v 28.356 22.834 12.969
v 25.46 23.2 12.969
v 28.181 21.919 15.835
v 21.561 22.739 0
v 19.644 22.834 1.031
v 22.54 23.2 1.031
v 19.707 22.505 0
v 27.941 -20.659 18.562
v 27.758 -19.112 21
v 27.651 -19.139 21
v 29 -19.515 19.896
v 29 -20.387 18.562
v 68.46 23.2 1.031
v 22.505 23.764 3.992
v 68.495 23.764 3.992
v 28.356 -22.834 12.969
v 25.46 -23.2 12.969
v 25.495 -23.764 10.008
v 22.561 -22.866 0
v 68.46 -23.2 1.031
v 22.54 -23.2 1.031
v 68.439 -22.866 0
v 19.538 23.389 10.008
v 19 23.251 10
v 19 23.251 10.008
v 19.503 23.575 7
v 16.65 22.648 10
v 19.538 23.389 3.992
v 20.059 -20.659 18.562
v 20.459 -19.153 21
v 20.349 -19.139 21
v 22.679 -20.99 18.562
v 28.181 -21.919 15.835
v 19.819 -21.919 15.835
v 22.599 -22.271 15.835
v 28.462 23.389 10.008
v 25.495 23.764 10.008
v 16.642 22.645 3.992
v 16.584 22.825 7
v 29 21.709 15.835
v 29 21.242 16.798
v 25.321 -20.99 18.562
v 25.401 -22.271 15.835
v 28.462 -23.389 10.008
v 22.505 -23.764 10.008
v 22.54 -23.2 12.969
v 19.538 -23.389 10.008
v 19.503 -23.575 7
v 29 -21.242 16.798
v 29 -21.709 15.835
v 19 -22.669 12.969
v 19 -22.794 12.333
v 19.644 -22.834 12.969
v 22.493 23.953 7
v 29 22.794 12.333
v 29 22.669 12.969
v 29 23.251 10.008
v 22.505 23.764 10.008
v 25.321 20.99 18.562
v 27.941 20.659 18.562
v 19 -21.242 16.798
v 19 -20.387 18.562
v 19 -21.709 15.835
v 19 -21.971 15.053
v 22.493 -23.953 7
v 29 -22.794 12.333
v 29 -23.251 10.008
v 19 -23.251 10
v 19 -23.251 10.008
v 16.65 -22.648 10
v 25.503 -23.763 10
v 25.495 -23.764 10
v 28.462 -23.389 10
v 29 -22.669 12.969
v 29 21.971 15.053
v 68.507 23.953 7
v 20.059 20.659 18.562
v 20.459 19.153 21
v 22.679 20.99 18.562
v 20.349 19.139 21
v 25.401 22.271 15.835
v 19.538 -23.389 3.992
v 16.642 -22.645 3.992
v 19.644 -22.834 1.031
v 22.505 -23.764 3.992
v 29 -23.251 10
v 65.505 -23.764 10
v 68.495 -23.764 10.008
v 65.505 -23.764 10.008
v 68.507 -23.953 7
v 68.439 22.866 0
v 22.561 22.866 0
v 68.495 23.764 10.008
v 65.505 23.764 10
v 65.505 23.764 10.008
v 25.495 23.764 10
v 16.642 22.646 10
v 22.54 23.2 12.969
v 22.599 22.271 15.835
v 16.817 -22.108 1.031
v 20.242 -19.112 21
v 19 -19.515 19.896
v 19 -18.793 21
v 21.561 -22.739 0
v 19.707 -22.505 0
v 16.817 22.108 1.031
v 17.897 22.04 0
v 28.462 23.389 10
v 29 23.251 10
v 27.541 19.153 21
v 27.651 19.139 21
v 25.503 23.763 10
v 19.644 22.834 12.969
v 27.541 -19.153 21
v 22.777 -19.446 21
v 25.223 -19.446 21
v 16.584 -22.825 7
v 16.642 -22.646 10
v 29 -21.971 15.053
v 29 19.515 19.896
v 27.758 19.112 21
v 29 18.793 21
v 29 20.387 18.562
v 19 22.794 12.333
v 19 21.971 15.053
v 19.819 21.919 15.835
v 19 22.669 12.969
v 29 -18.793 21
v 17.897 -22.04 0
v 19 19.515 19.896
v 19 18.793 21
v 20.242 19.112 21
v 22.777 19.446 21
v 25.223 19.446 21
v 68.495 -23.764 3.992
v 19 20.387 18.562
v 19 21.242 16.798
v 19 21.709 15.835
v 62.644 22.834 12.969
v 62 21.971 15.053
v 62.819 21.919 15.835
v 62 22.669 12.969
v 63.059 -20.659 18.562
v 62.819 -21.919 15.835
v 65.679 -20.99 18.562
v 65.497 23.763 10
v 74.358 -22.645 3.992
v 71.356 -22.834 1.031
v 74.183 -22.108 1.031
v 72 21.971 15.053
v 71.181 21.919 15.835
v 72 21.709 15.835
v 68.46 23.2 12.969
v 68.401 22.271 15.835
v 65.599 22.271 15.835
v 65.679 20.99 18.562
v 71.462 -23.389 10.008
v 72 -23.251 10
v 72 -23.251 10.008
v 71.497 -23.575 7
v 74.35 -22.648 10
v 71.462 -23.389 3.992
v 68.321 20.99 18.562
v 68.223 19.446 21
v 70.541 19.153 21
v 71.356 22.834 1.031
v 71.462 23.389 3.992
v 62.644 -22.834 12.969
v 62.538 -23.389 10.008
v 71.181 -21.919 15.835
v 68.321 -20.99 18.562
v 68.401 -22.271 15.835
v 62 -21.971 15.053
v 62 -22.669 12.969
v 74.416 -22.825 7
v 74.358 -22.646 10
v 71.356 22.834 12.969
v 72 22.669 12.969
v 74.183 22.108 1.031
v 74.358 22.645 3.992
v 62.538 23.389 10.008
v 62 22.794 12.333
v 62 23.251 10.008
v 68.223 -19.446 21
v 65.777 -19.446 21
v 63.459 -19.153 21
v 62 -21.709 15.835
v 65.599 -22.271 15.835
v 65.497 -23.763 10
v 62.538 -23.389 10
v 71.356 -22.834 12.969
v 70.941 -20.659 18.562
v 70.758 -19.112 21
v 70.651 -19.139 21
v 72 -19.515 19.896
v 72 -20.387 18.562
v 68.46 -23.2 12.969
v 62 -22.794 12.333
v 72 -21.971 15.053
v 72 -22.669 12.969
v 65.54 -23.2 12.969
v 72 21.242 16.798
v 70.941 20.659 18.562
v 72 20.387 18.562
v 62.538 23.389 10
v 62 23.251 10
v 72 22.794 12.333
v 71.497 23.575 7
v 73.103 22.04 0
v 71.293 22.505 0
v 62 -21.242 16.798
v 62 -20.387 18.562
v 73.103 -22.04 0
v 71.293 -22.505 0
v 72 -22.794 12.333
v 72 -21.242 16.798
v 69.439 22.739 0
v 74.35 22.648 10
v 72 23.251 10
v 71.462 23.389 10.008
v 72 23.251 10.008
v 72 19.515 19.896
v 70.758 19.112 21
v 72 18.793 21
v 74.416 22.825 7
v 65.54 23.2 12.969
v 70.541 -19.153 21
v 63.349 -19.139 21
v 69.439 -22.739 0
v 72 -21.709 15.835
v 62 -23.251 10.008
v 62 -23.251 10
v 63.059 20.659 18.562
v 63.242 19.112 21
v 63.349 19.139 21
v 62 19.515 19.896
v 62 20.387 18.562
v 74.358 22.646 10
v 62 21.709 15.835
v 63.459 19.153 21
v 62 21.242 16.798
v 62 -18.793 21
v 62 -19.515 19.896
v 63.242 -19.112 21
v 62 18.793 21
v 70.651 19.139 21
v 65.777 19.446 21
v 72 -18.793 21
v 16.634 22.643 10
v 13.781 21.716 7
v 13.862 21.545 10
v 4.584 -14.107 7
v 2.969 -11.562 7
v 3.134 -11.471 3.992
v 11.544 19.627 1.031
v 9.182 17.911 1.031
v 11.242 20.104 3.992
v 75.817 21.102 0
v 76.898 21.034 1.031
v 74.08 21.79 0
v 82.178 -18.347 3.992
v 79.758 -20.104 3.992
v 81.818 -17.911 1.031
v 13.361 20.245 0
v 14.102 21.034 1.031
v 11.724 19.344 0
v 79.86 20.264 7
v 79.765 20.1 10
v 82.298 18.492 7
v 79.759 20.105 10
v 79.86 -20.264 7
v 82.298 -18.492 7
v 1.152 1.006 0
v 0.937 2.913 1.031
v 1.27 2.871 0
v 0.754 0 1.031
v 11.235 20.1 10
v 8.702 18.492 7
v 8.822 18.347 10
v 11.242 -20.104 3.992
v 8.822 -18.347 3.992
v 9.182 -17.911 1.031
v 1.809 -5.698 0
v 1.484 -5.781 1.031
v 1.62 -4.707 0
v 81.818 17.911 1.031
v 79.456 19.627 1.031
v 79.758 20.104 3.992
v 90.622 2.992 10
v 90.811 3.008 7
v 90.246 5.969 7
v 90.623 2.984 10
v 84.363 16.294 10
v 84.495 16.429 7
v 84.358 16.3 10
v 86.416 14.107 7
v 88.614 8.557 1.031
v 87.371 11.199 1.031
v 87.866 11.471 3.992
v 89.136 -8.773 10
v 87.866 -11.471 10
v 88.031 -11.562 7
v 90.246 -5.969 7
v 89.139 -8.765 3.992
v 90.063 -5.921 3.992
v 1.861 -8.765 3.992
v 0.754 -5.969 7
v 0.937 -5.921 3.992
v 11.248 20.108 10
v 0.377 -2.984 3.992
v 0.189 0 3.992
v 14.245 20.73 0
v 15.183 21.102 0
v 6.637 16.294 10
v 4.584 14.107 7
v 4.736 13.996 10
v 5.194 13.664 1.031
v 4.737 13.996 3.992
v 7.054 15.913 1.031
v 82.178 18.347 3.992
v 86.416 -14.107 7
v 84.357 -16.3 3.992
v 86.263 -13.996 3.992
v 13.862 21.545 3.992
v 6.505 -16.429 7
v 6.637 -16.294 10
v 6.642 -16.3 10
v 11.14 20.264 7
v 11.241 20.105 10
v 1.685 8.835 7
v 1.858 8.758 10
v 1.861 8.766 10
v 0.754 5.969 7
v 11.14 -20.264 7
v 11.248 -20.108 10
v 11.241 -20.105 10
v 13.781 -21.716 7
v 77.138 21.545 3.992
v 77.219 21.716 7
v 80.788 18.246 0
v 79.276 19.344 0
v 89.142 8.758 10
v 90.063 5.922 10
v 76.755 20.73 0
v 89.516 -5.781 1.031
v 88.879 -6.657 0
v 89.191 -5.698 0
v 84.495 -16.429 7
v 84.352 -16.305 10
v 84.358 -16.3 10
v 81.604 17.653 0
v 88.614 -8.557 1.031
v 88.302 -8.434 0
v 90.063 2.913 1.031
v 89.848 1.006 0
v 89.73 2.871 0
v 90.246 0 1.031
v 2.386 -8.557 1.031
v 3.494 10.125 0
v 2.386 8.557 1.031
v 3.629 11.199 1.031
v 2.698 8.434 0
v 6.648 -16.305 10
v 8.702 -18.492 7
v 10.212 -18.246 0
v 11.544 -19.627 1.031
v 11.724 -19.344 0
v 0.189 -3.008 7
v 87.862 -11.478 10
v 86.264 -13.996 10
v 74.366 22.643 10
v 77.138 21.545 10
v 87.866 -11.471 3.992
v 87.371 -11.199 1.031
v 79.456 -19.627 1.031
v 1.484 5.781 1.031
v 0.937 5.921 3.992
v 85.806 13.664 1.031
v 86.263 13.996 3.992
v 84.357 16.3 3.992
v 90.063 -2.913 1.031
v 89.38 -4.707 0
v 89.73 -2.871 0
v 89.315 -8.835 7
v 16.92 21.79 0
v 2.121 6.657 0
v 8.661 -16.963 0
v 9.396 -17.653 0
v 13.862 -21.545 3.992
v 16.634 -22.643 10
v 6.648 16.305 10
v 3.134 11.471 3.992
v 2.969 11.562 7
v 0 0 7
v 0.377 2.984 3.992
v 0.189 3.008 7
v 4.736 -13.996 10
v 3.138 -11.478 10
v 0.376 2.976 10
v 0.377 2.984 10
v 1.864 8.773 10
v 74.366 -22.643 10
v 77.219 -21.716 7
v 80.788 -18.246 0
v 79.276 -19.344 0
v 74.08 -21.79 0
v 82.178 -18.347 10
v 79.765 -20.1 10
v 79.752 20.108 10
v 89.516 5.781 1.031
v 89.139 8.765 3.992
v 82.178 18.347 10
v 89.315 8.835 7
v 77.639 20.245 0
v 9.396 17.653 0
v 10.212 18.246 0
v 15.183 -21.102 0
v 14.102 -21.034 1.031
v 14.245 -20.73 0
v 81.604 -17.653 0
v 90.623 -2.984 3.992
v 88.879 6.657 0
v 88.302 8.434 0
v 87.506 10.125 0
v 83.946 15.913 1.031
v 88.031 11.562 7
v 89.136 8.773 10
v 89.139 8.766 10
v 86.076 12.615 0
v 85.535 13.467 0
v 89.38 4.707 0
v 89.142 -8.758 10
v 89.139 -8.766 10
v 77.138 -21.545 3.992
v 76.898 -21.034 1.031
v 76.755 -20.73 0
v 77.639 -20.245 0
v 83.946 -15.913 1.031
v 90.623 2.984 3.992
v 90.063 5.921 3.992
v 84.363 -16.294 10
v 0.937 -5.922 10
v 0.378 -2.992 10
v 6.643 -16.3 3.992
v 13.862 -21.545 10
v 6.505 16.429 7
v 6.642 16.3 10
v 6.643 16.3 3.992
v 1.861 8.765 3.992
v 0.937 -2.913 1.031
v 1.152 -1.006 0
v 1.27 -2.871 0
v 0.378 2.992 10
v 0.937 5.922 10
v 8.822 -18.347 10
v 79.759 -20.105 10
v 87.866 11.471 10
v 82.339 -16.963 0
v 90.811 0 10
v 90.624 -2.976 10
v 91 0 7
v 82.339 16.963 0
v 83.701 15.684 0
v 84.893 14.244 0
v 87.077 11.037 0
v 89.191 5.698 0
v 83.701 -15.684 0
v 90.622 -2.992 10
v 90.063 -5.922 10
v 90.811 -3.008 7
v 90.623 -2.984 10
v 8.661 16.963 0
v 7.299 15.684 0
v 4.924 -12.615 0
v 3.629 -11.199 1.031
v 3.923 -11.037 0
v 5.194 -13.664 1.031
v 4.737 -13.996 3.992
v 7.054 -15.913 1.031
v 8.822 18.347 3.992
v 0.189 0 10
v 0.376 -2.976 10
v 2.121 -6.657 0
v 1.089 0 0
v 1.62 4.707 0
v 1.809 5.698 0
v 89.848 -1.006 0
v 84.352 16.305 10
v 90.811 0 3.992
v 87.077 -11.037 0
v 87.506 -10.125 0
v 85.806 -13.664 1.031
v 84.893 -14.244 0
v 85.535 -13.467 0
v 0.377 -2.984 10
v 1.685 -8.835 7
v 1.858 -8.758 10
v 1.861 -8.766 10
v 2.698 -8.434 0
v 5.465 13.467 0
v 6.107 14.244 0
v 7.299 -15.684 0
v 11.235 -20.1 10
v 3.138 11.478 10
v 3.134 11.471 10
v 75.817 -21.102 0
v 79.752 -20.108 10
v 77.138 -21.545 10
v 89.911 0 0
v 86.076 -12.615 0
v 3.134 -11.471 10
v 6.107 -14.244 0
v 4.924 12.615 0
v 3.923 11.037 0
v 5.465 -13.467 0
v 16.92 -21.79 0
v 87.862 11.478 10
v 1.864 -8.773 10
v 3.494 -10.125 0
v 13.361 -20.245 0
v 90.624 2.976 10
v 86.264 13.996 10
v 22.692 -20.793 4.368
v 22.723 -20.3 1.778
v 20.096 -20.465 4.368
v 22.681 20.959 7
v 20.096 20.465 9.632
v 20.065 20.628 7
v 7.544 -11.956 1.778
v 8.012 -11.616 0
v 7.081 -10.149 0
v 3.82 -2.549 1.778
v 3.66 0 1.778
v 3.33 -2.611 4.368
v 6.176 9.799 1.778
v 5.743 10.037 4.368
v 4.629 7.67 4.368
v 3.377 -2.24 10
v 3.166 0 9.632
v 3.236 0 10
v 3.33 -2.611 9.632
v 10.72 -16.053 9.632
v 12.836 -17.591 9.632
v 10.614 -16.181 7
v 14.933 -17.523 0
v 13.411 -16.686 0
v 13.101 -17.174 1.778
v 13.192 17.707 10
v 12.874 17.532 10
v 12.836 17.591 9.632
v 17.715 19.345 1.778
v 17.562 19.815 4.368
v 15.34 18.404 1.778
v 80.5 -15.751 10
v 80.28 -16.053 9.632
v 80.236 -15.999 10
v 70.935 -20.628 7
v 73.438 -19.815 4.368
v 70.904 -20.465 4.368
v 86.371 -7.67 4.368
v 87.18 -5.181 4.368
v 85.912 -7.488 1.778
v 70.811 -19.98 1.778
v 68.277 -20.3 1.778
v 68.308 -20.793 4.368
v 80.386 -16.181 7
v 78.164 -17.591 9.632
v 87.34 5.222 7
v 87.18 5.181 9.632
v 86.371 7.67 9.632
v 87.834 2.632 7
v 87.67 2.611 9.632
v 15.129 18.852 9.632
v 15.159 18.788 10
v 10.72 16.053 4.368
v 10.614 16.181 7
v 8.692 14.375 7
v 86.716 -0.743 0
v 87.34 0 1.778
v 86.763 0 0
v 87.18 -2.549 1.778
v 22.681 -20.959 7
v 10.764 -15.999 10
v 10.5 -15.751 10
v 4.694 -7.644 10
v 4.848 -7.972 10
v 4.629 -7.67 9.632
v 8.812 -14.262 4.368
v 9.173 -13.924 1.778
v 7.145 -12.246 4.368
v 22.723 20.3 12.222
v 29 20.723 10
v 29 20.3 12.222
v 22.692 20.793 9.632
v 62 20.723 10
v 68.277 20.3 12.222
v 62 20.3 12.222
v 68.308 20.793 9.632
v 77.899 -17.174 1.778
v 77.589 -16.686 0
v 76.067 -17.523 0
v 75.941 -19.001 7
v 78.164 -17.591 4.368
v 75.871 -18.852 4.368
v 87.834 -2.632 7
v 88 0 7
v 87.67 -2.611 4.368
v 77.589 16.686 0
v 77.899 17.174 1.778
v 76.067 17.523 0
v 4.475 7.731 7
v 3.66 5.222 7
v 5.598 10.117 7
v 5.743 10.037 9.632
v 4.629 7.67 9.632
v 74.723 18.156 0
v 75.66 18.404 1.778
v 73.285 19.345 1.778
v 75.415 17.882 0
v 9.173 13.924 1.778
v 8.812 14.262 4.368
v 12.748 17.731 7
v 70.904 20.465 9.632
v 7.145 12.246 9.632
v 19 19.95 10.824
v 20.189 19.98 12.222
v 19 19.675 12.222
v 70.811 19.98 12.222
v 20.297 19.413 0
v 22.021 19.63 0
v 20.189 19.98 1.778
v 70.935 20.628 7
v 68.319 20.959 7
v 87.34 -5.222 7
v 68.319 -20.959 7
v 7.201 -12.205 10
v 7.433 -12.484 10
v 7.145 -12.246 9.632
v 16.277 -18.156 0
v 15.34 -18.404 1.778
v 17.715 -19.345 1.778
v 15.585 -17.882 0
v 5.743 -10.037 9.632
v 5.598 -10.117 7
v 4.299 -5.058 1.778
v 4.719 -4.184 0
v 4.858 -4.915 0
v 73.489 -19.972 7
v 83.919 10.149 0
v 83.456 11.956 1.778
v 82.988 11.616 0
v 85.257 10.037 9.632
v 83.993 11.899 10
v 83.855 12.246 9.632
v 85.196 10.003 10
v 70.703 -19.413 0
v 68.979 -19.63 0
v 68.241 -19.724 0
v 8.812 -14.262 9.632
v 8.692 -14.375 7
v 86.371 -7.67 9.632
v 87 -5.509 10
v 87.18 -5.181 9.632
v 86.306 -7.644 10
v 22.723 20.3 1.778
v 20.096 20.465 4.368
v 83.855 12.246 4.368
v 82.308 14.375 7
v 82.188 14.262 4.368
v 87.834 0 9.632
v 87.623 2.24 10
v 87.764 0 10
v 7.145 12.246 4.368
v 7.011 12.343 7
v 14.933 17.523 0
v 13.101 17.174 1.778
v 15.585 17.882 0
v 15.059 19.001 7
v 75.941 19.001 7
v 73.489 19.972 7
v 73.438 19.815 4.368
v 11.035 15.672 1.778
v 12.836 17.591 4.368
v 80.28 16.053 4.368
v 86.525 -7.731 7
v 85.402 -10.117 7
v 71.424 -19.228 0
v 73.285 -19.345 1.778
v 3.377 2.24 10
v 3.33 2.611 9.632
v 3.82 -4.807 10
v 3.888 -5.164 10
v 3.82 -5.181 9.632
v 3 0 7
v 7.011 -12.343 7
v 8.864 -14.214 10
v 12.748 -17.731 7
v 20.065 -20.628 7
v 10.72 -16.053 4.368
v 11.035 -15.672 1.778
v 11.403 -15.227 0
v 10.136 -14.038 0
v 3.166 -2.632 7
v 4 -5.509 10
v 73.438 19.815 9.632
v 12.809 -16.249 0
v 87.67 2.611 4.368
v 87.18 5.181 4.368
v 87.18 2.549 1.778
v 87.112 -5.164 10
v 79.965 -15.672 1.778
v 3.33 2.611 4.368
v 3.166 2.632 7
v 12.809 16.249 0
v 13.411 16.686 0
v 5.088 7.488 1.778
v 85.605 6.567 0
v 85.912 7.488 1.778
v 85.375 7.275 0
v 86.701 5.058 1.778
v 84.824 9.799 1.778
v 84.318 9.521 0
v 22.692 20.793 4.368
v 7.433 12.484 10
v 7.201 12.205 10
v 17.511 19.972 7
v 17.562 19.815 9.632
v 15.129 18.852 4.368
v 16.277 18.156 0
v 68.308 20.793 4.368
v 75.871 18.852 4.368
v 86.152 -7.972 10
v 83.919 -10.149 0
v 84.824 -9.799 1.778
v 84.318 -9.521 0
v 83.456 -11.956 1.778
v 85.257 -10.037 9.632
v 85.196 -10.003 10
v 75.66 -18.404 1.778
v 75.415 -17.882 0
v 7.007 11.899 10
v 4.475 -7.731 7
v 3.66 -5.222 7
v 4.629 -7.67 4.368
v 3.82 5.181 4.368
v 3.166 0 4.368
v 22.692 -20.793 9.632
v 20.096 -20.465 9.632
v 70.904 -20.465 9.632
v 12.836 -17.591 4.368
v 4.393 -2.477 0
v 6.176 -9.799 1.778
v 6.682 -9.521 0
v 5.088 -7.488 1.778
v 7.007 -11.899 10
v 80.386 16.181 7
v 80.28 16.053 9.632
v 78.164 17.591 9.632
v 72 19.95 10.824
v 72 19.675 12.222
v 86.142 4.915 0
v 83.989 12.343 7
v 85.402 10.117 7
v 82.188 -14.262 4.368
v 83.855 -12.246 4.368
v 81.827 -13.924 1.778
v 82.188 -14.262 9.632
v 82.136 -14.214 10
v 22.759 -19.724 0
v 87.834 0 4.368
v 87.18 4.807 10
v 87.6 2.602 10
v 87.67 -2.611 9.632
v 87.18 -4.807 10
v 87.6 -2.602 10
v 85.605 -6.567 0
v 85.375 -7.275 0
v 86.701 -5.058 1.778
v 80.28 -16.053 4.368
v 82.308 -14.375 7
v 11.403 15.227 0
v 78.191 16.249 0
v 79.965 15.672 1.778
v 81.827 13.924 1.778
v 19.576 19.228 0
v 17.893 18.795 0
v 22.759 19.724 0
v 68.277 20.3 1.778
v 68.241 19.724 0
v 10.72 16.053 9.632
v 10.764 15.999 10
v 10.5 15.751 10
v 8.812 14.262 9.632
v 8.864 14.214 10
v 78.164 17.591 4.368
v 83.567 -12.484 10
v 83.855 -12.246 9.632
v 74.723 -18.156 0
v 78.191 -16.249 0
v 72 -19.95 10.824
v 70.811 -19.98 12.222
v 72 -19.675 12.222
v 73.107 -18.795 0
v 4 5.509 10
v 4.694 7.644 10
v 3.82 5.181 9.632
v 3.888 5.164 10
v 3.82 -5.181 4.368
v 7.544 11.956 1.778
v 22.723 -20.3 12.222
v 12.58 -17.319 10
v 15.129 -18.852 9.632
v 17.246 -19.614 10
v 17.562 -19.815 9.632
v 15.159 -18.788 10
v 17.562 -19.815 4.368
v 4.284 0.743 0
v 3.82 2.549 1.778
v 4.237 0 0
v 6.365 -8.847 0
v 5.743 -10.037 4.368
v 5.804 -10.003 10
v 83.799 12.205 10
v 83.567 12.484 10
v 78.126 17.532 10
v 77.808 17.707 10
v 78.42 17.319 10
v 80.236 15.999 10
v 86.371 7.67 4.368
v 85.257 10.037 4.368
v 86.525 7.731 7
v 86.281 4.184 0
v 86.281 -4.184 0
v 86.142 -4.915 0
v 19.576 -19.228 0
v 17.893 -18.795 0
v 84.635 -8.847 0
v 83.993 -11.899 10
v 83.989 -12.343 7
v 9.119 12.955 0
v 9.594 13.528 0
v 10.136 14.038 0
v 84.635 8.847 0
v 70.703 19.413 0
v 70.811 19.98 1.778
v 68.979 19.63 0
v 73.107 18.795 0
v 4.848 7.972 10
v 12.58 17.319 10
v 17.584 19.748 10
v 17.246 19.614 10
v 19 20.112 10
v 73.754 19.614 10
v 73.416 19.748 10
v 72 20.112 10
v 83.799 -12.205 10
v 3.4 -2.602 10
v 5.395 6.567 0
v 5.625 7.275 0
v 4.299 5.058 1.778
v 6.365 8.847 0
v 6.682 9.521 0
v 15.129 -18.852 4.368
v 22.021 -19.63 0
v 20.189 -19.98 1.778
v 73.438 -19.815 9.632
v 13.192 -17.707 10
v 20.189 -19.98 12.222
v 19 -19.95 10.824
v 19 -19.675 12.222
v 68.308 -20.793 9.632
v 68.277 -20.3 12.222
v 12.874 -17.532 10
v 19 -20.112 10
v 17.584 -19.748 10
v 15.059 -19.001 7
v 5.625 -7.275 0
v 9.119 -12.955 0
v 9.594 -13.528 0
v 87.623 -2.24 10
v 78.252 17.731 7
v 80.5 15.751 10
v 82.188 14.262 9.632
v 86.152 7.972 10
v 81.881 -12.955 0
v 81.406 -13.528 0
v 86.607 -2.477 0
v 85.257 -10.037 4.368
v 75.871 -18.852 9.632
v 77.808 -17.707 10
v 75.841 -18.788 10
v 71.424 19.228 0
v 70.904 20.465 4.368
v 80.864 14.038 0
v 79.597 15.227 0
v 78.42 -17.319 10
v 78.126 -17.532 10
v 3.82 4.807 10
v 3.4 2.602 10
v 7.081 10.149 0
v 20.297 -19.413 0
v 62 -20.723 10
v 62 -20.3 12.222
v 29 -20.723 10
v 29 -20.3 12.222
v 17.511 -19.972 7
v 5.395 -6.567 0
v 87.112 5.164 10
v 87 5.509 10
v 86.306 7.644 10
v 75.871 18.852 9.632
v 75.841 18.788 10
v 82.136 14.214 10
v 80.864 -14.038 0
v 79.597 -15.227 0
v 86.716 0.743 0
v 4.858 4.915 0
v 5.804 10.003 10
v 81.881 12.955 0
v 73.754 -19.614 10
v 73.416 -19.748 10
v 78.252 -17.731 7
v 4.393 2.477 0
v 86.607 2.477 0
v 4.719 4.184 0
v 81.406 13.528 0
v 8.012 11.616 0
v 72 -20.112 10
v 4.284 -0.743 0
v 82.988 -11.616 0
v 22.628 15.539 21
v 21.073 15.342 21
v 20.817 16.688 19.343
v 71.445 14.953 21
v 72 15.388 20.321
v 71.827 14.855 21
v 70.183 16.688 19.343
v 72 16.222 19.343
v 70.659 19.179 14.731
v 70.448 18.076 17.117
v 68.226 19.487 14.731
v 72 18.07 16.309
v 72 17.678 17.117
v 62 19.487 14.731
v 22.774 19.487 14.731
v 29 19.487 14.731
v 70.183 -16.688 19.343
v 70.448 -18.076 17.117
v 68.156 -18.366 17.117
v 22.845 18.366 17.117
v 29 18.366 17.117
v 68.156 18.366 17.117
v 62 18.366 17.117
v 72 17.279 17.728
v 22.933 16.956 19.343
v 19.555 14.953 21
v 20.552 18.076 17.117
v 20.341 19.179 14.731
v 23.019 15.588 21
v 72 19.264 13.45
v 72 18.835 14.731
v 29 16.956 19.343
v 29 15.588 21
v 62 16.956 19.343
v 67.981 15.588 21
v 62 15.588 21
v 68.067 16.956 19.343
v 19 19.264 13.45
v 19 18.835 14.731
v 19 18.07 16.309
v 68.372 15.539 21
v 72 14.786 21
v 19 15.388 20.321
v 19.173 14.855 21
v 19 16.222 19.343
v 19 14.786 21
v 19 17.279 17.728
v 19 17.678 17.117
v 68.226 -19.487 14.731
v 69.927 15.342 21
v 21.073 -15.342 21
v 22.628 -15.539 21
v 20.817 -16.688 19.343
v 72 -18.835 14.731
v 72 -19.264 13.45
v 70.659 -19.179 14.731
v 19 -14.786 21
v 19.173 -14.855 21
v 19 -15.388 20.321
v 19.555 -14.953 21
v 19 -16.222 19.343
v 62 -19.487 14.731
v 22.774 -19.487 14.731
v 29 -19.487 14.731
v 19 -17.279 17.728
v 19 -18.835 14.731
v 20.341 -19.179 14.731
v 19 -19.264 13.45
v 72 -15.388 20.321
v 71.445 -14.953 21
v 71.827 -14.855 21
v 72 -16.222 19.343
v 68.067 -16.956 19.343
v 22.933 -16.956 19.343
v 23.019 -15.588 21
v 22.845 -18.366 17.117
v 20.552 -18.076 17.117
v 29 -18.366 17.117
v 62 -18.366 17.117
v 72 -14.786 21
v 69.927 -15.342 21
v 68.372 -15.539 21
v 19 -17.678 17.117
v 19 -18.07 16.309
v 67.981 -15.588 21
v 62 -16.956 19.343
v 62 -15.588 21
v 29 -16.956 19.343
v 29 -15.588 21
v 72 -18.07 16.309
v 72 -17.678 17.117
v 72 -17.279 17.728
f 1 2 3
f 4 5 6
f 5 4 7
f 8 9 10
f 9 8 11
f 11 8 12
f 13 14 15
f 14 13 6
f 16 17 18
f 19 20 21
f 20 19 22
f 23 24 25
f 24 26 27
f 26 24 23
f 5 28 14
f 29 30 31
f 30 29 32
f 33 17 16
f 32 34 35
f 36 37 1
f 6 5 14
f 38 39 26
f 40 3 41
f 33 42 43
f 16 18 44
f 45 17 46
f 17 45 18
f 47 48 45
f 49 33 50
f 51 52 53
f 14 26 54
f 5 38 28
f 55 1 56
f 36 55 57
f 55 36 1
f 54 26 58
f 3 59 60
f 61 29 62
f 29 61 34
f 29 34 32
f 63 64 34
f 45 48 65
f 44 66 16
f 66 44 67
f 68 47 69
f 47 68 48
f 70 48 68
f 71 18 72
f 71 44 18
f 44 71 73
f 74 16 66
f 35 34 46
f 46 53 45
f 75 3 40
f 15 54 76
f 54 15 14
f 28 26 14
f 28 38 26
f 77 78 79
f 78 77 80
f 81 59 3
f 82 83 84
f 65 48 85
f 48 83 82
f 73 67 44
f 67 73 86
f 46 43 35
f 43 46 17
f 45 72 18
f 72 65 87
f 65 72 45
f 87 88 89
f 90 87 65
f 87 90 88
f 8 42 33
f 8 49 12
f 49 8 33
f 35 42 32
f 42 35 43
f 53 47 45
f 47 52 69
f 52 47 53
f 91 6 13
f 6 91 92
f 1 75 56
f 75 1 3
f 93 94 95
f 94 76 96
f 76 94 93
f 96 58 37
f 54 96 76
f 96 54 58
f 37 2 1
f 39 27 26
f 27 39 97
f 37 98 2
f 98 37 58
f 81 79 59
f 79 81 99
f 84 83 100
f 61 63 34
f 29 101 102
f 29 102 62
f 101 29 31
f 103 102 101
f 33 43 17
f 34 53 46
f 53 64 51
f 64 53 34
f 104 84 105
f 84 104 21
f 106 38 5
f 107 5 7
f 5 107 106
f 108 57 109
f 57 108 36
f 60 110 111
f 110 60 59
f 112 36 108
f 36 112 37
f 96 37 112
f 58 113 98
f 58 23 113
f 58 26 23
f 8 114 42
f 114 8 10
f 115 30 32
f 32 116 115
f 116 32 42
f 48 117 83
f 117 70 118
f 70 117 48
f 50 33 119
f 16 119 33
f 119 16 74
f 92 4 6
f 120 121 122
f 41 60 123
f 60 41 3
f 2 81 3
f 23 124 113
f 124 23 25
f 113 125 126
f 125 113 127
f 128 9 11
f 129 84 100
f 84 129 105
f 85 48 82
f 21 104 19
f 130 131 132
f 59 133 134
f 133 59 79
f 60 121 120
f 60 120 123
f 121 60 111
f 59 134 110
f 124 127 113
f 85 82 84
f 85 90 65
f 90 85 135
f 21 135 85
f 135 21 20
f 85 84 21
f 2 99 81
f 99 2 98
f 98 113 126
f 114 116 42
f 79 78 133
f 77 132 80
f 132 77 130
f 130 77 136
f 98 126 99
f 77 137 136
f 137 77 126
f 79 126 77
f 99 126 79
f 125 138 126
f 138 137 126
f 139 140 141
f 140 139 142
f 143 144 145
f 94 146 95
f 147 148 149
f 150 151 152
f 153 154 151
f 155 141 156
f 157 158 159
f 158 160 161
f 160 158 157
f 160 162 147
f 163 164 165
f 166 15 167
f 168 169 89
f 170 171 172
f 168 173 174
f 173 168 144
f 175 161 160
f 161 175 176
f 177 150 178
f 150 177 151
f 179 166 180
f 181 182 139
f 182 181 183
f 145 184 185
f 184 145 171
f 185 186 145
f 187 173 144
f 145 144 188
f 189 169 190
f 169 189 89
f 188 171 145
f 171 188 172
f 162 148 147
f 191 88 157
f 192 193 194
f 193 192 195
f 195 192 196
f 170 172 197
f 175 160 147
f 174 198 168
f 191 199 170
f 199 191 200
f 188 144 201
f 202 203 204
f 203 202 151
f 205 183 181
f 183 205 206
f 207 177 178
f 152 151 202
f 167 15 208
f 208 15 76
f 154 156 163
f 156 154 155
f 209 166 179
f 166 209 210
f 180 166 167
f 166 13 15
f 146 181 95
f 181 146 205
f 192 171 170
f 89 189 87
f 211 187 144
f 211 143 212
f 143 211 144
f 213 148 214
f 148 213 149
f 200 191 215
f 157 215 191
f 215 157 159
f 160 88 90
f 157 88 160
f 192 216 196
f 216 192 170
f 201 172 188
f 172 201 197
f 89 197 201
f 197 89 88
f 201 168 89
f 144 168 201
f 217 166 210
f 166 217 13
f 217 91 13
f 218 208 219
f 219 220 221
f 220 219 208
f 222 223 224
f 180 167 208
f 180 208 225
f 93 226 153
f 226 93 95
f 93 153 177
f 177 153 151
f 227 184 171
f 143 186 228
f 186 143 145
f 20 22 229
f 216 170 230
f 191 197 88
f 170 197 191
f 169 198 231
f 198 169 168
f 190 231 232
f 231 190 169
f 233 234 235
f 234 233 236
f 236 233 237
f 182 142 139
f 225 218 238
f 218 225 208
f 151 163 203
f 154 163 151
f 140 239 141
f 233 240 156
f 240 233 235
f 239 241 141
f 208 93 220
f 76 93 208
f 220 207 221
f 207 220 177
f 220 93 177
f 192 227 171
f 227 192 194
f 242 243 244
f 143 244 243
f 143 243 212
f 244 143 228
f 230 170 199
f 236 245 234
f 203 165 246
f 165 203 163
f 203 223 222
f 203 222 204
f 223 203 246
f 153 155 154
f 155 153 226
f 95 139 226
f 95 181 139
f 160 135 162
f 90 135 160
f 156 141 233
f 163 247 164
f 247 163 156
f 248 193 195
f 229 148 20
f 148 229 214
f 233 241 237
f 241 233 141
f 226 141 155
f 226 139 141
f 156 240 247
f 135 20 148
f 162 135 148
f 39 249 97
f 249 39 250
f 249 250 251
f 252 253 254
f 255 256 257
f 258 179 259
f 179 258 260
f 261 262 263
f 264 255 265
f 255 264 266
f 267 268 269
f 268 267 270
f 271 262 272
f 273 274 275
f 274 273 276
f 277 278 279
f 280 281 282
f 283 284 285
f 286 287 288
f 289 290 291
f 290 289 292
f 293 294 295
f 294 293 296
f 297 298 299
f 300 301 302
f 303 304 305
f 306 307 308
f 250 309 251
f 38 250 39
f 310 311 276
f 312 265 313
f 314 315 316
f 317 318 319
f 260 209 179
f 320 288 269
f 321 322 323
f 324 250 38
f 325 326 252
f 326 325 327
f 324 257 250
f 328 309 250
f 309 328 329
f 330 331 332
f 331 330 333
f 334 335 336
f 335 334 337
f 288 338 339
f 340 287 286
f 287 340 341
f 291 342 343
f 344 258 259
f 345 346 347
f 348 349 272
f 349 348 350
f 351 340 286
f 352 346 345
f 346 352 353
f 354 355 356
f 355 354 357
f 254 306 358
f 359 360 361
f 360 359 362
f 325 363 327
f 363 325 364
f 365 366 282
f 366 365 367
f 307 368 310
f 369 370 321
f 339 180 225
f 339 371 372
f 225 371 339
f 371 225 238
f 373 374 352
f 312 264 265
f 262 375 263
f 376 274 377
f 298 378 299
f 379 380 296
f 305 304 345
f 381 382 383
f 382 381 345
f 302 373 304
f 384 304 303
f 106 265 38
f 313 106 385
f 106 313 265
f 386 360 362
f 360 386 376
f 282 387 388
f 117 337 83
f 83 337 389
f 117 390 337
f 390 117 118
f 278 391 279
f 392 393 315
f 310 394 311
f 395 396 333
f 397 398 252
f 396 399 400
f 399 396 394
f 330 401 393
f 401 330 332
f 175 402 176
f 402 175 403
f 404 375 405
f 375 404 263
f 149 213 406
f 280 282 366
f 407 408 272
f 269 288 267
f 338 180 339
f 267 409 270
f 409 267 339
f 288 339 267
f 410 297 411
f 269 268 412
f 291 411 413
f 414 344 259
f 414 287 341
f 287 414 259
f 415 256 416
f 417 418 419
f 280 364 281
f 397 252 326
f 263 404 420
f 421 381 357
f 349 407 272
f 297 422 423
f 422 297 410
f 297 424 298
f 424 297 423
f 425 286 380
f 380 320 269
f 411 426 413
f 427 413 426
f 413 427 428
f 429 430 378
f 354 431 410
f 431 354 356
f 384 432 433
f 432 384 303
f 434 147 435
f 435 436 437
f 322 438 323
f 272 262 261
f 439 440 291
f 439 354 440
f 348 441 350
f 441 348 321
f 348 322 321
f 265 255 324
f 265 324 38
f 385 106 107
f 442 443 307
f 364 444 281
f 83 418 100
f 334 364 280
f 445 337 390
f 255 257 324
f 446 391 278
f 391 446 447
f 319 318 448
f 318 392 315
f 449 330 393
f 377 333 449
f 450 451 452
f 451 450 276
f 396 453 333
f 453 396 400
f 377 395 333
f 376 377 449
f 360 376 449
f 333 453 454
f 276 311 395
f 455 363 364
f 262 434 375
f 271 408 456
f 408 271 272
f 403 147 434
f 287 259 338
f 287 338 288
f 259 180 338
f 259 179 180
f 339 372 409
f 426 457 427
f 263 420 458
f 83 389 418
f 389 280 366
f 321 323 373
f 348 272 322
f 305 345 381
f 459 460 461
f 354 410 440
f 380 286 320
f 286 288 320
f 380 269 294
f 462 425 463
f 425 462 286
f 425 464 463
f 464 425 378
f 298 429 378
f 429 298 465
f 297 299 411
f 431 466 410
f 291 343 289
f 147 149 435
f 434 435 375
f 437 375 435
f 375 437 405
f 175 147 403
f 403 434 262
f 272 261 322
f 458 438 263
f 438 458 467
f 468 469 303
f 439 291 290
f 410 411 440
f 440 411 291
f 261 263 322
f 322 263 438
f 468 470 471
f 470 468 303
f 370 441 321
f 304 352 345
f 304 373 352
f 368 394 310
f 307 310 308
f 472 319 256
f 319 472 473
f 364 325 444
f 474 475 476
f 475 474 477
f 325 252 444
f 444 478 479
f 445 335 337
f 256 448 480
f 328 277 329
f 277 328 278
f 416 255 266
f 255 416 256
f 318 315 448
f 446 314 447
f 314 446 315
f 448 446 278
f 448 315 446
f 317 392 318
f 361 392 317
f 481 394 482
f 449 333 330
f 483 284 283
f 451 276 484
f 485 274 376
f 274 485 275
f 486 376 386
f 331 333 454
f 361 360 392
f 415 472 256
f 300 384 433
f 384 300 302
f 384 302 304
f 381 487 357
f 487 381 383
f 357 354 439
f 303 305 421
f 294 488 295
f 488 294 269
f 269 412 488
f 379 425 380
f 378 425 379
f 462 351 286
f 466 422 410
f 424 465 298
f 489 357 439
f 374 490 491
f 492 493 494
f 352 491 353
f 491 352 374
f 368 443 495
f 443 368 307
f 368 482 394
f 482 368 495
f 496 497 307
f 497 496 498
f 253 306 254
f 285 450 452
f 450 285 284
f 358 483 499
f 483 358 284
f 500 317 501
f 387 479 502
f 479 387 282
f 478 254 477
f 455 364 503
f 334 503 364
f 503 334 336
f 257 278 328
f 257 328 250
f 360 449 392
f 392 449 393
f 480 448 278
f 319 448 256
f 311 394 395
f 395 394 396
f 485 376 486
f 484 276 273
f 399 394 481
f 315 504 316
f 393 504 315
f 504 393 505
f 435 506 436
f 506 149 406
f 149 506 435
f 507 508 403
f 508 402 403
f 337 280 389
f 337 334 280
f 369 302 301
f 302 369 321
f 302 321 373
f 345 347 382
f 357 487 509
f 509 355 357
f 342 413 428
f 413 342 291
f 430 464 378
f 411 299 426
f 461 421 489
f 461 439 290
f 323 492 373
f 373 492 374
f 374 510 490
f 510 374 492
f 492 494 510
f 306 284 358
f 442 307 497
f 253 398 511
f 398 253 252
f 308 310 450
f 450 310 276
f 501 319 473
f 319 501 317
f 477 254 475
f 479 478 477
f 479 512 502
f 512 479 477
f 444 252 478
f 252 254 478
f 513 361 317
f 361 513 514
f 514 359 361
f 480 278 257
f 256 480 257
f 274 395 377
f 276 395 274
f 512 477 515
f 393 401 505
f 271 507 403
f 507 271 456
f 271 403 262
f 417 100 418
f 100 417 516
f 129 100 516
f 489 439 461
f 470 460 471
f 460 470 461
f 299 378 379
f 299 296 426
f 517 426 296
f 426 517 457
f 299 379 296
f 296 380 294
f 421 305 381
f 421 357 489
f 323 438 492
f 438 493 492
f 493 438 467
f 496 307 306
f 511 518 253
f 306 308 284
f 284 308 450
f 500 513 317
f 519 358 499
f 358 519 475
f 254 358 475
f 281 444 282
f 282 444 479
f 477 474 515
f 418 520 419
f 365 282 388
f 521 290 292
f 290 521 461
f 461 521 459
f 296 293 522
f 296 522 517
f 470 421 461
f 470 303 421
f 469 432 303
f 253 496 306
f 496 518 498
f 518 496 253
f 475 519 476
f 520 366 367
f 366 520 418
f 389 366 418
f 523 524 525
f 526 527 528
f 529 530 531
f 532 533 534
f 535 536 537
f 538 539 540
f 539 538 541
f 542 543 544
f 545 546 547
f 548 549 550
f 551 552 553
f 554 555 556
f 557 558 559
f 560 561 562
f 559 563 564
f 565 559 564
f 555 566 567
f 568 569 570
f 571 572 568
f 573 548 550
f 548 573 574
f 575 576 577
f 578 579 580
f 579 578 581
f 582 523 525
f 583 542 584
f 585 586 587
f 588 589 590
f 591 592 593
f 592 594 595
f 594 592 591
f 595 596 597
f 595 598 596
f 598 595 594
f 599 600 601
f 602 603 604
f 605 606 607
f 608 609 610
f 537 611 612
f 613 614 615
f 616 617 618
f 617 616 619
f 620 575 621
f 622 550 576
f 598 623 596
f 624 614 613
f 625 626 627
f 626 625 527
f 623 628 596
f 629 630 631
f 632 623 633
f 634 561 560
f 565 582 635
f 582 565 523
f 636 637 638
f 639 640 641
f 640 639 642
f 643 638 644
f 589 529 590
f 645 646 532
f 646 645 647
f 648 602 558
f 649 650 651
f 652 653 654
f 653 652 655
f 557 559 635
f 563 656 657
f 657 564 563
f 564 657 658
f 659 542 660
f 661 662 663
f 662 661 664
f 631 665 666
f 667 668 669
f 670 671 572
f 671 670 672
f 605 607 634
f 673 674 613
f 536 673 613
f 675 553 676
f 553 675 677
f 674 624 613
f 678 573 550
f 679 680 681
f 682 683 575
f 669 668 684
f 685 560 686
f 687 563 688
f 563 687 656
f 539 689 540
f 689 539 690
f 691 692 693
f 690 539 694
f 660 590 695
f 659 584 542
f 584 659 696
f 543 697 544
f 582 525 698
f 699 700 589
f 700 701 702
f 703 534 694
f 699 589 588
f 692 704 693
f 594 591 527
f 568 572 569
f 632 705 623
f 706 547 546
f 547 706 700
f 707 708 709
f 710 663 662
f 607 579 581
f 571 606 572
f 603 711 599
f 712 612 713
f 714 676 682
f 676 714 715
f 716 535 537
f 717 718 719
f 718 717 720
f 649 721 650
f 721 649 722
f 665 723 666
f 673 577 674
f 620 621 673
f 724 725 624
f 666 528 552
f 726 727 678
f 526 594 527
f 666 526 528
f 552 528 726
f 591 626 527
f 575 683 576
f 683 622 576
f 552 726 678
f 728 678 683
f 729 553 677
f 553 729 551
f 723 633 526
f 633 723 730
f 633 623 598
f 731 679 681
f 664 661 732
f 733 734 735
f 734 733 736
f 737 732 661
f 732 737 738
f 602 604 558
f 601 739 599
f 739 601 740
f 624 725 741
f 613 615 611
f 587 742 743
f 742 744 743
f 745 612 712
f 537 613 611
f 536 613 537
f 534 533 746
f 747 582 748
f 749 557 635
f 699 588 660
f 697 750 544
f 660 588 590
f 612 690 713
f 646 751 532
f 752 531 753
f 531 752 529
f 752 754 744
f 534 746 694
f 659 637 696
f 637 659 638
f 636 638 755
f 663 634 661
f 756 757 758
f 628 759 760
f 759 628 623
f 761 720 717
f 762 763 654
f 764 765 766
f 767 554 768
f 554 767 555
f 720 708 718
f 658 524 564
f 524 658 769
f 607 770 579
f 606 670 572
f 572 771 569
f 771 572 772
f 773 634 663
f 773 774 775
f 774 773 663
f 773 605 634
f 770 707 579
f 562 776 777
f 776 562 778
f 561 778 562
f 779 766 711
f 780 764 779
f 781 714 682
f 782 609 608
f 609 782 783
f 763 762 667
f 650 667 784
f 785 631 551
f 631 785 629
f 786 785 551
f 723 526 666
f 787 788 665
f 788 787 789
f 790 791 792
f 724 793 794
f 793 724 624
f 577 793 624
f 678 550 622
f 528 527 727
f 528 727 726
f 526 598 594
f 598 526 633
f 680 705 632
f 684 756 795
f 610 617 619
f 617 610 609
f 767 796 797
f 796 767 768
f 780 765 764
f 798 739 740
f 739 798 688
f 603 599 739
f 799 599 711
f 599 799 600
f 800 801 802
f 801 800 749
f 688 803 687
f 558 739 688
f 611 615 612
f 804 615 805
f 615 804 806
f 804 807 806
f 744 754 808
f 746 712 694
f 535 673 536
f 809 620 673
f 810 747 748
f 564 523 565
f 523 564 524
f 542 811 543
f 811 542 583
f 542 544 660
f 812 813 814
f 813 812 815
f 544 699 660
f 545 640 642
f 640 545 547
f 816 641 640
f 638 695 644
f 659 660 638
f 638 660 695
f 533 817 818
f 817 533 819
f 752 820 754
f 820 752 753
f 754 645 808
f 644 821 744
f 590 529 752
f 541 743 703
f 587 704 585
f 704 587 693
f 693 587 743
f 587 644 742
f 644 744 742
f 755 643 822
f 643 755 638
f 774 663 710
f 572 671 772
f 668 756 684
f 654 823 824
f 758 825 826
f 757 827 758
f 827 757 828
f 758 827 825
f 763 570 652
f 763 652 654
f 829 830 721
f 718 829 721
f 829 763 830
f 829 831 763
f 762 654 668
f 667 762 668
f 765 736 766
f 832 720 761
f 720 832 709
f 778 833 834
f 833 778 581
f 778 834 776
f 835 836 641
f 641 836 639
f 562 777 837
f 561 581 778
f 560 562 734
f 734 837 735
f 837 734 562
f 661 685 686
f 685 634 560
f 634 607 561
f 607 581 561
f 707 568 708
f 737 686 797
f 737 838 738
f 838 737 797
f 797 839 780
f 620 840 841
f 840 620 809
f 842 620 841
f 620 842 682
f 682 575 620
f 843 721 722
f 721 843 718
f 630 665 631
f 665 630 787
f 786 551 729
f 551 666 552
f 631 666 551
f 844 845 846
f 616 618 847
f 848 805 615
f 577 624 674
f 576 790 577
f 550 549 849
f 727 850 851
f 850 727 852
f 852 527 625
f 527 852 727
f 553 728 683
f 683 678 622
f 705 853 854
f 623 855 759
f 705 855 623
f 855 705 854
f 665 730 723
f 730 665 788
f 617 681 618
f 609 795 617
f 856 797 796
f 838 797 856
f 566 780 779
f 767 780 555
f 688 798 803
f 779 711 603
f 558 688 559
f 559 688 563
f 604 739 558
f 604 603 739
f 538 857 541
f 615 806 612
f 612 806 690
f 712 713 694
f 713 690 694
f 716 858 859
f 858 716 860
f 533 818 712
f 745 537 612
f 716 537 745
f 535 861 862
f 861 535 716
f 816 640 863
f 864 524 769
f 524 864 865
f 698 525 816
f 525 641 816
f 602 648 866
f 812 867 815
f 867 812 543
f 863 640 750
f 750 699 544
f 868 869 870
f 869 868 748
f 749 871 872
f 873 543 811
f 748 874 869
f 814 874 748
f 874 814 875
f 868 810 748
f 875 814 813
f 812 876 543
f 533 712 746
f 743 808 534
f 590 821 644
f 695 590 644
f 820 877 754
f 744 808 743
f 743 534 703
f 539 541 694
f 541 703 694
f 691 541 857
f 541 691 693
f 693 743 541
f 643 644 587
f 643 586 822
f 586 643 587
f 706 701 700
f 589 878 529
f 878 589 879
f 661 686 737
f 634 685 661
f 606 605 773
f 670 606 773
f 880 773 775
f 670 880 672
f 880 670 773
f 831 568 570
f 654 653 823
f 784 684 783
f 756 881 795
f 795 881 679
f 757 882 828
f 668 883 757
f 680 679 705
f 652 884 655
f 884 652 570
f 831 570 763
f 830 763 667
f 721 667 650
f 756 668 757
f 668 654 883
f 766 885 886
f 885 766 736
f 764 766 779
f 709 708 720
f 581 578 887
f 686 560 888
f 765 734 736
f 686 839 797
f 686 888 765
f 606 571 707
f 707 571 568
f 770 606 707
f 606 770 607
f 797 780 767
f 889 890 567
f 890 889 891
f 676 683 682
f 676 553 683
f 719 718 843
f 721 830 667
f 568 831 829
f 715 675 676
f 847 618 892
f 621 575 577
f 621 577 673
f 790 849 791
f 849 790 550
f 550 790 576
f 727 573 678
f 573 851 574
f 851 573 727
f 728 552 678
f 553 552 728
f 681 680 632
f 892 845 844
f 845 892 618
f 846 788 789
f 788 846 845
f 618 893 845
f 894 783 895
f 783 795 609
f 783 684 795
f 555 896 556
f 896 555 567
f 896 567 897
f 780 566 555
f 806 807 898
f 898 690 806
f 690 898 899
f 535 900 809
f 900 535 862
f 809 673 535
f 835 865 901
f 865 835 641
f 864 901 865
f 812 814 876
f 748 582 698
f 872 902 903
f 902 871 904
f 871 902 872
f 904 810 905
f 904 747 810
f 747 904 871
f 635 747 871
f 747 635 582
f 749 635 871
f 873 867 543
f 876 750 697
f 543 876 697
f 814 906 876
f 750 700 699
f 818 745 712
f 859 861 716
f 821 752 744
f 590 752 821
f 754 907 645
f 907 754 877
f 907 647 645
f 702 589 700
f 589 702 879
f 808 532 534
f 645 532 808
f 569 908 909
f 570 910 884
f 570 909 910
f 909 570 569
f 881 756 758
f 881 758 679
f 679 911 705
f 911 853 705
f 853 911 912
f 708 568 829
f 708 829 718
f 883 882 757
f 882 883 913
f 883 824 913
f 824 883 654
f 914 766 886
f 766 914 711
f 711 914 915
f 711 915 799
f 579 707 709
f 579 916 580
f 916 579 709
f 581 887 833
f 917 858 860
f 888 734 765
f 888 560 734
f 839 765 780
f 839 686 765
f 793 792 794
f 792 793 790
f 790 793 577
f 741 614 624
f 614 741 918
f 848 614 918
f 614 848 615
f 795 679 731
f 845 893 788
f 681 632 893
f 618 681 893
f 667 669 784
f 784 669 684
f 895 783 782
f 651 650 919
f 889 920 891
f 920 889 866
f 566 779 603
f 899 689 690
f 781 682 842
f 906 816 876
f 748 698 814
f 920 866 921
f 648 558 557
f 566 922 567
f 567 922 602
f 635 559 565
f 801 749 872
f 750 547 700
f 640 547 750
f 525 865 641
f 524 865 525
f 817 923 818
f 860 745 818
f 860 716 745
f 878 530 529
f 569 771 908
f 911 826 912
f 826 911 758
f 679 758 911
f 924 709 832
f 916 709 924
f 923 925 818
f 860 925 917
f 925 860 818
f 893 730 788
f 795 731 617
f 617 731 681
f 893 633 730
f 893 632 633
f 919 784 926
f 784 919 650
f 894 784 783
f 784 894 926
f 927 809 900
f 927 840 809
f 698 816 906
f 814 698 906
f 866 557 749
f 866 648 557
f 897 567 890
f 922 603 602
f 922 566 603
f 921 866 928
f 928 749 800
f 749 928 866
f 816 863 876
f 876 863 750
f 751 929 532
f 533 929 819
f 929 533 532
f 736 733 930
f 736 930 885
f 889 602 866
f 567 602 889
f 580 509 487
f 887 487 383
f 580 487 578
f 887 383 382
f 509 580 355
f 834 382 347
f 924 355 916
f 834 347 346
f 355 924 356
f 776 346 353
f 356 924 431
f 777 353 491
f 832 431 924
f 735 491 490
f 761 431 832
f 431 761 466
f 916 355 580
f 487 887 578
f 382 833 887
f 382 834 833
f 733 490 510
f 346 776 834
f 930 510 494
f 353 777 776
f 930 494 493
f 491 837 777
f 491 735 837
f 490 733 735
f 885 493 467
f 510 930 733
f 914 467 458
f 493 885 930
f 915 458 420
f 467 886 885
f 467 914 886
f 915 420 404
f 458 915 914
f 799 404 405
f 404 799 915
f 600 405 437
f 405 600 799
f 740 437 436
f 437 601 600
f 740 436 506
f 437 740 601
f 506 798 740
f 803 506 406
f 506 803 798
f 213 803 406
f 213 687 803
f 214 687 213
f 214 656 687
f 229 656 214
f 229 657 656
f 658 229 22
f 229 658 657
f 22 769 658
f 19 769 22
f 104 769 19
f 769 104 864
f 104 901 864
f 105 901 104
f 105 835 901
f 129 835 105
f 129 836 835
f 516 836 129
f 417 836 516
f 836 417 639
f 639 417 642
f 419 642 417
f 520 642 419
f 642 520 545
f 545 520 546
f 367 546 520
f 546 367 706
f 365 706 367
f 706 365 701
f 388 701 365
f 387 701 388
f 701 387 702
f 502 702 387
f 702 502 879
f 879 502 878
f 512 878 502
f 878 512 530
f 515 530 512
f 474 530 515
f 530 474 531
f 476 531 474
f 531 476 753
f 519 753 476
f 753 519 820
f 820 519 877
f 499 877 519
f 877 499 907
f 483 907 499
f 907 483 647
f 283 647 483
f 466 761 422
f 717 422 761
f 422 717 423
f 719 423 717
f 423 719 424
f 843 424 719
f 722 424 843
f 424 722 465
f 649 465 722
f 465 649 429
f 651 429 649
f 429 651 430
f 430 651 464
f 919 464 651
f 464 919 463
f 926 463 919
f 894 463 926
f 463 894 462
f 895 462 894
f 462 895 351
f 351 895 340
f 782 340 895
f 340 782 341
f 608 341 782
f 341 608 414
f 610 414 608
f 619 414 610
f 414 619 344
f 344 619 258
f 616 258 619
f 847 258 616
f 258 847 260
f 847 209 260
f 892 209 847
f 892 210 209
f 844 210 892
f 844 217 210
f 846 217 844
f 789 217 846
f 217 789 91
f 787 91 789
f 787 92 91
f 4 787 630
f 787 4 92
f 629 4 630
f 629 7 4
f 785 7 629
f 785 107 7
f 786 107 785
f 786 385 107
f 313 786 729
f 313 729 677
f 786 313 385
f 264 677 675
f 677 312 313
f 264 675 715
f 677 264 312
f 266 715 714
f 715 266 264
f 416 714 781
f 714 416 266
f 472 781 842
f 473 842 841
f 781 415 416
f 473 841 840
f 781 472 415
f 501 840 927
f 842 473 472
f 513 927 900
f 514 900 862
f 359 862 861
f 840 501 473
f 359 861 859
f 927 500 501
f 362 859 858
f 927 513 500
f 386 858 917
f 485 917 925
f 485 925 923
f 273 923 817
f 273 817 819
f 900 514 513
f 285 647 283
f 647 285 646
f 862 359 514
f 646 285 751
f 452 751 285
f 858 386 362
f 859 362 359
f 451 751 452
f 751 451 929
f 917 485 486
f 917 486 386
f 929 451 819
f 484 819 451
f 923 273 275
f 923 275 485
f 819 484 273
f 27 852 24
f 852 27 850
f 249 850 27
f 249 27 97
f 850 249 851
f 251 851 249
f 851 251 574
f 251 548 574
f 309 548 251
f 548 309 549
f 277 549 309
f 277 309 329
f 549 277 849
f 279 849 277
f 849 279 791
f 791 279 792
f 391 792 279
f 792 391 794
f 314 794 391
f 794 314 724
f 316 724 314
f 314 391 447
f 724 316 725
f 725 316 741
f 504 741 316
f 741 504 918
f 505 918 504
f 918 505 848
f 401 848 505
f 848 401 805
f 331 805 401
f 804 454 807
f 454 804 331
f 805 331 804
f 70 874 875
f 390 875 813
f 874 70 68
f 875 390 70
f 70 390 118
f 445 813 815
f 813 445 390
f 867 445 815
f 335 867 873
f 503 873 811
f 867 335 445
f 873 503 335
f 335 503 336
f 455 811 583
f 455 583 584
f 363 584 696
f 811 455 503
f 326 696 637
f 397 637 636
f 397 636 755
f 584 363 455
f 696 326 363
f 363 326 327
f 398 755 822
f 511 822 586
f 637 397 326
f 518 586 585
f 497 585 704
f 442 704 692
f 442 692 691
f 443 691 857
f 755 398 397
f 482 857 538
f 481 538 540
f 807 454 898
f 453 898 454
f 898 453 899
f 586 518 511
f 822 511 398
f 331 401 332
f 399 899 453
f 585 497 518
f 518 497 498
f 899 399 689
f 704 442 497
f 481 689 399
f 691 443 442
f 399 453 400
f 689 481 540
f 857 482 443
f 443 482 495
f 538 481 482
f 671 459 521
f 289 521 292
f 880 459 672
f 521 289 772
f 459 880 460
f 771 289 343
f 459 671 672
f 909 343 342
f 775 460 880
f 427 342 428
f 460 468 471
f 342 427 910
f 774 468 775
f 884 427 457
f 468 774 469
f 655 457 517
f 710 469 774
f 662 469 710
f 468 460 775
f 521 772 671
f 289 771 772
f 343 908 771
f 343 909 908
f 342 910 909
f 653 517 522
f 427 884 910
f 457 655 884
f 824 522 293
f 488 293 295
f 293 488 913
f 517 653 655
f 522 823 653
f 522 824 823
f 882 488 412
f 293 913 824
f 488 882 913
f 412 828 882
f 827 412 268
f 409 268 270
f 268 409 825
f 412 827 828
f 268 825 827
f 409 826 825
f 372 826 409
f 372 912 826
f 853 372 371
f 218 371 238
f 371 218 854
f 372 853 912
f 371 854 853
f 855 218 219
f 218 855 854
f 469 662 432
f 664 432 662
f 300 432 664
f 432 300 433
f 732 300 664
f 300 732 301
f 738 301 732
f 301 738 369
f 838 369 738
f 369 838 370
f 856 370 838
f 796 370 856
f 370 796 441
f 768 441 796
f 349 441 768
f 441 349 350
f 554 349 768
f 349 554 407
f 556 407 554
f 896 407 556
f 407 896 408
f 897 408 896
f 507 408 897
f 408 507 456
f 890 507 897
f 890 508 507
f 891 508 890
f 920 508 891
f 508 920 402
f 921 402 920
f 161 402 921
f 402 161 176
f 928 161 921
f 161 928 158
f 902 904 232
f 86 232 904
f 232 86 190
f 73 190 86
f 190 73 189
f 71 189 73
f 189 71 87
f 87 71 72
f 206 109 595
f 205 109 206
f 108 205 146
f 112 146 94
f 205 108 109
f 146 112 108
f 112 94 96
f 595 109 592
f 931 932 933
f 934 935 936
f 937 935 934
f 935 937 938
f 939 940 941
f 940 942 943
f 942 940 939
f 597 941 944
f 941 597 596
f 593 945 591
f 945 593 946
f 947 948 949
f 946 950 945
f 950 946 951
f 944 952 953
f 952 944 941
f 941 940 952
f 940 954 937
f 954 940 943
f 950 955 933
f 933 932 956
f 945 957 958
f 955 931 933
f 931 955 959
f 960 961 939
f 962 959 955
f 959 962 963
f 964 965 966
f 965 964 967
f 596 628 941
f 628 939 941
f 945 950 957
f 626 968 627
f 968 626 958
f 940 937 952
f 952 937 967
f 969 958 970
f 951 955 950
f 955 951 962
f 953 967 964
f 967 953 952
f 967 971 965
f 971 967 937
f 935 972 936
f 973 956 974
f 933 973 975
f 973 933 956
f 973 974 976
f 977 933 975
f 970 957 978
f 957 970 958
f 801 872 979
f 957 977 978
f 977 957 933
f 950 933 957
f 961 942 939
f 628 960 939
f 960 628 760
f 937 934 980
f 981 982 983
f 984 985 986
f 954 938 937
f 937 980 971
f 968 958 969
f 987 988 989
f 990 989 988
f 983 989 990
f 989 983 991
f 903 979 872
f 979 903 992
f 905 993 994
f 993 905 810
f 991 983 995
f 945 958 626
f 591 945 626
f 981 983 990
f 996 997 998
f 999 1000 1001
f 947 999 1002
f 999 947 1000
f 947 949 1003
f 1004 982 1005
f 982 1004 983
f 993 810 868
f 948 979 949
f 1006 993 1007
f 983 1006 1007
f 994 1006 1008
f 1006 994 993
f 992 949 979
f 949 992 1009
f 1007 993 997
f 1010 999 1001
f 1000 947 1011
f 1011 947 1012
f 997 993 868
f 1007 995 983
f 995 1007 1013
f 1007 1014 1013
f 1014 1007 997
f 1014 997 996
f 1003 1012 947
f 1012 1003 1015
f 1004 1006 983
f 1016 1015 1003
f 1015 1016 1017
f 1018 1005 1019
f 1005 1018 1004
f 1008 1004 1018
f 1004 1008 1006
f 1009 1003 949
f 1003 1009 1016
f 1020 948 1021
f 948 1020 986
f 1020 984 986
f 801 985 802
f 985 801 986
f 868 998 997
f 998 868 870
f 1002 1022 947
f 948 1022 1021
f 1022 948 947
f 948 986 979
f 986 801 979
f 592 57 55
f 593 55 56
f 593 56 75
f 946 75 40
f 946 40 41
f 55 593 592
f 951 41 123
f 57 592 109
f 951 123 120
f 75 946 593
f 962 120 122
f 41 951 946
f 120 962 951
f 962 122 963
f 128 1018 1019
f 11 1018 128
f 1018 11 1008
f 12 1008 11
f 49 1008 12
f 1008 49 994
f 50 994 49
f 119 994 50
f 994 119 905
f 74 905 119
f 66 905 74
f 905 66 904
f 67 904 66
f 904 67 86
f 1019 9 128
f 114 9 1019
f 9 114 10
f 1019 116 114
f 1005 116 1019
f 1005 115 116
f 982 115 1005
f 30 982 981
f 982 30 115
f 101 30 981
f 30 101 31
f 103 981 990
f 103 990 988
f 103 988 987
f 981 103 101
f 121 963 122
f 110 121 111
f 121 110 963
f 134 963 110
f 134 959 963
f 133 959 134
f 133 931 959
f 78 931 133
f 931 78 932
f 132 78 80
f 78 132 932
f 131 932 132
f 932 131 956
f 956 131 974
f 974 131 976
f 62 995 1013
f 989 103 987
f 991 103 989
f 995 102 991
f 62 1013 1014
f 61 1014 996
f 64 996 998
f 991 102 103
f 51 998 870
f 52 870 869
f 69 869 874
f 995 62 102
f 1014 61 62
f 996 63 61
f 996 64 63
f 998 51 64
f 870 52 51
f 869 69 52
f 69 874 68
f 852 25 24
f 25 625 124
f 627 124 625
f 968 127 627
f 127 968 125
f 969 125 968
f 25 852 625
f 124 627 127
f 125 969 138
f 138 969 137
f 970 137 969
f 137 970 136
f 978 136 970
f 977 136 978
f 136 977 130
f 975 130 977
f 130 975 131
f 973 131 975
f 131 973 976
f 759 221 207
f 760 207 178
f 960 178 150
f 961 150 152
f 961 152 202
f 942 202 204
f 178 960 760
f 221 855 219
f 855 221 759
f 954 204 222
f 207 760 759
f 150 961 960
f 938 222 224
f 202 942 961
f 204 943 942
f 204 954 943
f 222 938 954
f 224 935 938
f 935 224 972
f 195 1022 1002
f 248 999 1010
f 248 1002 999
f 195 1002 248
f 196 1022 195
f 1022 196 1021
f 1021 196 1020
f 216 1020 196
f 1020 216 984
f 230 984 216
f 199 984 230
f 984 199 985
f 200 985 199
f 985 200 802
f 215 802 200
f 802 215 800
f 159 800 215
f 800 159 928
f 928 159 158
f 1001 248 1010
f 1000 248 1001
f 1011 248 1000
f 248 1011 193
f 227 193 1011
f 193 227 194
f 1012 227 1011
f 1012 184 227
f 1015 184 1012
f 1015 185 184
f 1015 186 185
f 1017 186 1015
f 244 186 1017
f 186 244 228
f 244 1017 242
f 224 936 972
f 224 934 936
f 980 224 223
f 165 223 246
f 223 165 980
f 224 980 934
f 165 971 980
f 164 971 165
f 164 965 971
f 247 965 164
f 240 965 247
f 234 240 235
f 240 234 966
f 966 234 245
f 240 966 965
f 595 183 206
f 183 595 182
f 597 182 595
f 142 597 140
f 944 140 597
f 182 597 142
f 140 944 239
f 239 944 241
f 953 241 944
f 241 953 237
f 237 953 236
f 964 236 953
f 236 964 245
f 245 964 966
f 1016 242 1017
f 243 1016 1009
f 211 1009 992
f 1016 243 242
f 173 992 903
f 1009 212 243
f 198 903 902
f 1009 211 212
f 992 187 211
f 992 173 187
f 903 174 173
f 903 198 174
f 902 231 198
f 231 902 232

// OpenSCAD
// file: dimensions.scad
epsilon = 0.1; // utilisé pour éviter que les évidements se fassent mal
jeu = 2; // jeu à prévoir 

encastrement = 1; // encastrements a coller

w = 50; // largeur intérieure du puits
l = 73; // longueur intérieure du puits
h = 15; // hauteur du puits
e = 3; // epaisseur du puits
h_cb = 10; // hauteur ceinture basse
delta_h = 7; // hauteur supplementaire a prevoir en dessous du milieu des balles pour qu'elles soient retenues dans la cage


ha = 40; //hauteur de l'attache, entre le puits et le porte balles

d = 40; // diamètre des balles de ping pong

l_m = 10; // largeur des montants
h_m = 20; // hauteur des montants

$fn=50;
// main file
include <dimensions.scad>

included=false; // this value will be overriden in the including file
included_in_attache=false; // this value will be overriden in the including file
included_in_sommet=false; // this value will be overriden in the including file


module balle()
{
    sphere(d=d);
}

module cubes_montants() 
{
    translate ([d/2+e+jeu/2-l_m/2,-d/2-e-jeu/2,0]) 
        cube([l_m,d+2*e+jeu, h_m+encastrement]);
    translate ([3*d/2+2*e+jeu/2-l_m/2,-d/2-e-jeu/2,0]) 
        cube([l_m,d+2*e+jeu, h_m+encastrement]);
}


module montants() {
    intersection () {
        difference() {
            enveloppe_ext(hull=false);
            enveloppe_int(hull=true);
        }
        cubes_montants();
    }
}

module porte_balles()
{
    intersection () {
        enveloppe(hull=true);
        union () {
            // ceinture basse
            translate ([0,-d/2-e-jeu/2,0]) 
                cube([2*d+3*e+jeu,d+2*e+jeu, h_cb]);
        }
    }
    // montants
    montants();
    
    if (included) {
        translate ([d/2+e+jeu/2,0,delta_h])
            balle();
        translate ([d/2+e+d+e+jeu/2,0,delta_h])
            balle();
    }
}

module grandes_spheres() {
    translate([d/2+e+jeu/2,0,delta_h])
        sphere(d=d+2*e+jeu);
    translate([d/2+e+d+e+jeu/2,0,delta_h])
        sphere(d=d+2*e+jeu);
}

module petites_spheres() {
    translate([d/2+e+jeu/2,0,delta_h])
        sphere(d=d+jeu);
    translate([d/2+e+d+e+jeu/2,0,delta_h])
        sphere(d=d+jeu);
}

module enveloppe_ext(hull) {
    if (hull) {
        hull () grandes_spheres();
    } else {
        grandes_spheres();
    }
}

module enveloppe_int(hull) {
    if (hull) {
        hull () petites_spheres();
    } else {
        petites_spheres();
    }
}

module enveloppe(hull)
{
    intersection () {
        difference () {
            enveloppe_ext(hull);
            enveloppe_int(hull);            
        }
        translate ([0,-d/2-e-jeu/2,0])
            cube([2*d+3*e+jeu,d+2*e+jeu,d /* suffisamment haut */]);
    }
}
    
if (!included && !included_in_sommet && !included_in_attache) {
    porte_balles();
} 
